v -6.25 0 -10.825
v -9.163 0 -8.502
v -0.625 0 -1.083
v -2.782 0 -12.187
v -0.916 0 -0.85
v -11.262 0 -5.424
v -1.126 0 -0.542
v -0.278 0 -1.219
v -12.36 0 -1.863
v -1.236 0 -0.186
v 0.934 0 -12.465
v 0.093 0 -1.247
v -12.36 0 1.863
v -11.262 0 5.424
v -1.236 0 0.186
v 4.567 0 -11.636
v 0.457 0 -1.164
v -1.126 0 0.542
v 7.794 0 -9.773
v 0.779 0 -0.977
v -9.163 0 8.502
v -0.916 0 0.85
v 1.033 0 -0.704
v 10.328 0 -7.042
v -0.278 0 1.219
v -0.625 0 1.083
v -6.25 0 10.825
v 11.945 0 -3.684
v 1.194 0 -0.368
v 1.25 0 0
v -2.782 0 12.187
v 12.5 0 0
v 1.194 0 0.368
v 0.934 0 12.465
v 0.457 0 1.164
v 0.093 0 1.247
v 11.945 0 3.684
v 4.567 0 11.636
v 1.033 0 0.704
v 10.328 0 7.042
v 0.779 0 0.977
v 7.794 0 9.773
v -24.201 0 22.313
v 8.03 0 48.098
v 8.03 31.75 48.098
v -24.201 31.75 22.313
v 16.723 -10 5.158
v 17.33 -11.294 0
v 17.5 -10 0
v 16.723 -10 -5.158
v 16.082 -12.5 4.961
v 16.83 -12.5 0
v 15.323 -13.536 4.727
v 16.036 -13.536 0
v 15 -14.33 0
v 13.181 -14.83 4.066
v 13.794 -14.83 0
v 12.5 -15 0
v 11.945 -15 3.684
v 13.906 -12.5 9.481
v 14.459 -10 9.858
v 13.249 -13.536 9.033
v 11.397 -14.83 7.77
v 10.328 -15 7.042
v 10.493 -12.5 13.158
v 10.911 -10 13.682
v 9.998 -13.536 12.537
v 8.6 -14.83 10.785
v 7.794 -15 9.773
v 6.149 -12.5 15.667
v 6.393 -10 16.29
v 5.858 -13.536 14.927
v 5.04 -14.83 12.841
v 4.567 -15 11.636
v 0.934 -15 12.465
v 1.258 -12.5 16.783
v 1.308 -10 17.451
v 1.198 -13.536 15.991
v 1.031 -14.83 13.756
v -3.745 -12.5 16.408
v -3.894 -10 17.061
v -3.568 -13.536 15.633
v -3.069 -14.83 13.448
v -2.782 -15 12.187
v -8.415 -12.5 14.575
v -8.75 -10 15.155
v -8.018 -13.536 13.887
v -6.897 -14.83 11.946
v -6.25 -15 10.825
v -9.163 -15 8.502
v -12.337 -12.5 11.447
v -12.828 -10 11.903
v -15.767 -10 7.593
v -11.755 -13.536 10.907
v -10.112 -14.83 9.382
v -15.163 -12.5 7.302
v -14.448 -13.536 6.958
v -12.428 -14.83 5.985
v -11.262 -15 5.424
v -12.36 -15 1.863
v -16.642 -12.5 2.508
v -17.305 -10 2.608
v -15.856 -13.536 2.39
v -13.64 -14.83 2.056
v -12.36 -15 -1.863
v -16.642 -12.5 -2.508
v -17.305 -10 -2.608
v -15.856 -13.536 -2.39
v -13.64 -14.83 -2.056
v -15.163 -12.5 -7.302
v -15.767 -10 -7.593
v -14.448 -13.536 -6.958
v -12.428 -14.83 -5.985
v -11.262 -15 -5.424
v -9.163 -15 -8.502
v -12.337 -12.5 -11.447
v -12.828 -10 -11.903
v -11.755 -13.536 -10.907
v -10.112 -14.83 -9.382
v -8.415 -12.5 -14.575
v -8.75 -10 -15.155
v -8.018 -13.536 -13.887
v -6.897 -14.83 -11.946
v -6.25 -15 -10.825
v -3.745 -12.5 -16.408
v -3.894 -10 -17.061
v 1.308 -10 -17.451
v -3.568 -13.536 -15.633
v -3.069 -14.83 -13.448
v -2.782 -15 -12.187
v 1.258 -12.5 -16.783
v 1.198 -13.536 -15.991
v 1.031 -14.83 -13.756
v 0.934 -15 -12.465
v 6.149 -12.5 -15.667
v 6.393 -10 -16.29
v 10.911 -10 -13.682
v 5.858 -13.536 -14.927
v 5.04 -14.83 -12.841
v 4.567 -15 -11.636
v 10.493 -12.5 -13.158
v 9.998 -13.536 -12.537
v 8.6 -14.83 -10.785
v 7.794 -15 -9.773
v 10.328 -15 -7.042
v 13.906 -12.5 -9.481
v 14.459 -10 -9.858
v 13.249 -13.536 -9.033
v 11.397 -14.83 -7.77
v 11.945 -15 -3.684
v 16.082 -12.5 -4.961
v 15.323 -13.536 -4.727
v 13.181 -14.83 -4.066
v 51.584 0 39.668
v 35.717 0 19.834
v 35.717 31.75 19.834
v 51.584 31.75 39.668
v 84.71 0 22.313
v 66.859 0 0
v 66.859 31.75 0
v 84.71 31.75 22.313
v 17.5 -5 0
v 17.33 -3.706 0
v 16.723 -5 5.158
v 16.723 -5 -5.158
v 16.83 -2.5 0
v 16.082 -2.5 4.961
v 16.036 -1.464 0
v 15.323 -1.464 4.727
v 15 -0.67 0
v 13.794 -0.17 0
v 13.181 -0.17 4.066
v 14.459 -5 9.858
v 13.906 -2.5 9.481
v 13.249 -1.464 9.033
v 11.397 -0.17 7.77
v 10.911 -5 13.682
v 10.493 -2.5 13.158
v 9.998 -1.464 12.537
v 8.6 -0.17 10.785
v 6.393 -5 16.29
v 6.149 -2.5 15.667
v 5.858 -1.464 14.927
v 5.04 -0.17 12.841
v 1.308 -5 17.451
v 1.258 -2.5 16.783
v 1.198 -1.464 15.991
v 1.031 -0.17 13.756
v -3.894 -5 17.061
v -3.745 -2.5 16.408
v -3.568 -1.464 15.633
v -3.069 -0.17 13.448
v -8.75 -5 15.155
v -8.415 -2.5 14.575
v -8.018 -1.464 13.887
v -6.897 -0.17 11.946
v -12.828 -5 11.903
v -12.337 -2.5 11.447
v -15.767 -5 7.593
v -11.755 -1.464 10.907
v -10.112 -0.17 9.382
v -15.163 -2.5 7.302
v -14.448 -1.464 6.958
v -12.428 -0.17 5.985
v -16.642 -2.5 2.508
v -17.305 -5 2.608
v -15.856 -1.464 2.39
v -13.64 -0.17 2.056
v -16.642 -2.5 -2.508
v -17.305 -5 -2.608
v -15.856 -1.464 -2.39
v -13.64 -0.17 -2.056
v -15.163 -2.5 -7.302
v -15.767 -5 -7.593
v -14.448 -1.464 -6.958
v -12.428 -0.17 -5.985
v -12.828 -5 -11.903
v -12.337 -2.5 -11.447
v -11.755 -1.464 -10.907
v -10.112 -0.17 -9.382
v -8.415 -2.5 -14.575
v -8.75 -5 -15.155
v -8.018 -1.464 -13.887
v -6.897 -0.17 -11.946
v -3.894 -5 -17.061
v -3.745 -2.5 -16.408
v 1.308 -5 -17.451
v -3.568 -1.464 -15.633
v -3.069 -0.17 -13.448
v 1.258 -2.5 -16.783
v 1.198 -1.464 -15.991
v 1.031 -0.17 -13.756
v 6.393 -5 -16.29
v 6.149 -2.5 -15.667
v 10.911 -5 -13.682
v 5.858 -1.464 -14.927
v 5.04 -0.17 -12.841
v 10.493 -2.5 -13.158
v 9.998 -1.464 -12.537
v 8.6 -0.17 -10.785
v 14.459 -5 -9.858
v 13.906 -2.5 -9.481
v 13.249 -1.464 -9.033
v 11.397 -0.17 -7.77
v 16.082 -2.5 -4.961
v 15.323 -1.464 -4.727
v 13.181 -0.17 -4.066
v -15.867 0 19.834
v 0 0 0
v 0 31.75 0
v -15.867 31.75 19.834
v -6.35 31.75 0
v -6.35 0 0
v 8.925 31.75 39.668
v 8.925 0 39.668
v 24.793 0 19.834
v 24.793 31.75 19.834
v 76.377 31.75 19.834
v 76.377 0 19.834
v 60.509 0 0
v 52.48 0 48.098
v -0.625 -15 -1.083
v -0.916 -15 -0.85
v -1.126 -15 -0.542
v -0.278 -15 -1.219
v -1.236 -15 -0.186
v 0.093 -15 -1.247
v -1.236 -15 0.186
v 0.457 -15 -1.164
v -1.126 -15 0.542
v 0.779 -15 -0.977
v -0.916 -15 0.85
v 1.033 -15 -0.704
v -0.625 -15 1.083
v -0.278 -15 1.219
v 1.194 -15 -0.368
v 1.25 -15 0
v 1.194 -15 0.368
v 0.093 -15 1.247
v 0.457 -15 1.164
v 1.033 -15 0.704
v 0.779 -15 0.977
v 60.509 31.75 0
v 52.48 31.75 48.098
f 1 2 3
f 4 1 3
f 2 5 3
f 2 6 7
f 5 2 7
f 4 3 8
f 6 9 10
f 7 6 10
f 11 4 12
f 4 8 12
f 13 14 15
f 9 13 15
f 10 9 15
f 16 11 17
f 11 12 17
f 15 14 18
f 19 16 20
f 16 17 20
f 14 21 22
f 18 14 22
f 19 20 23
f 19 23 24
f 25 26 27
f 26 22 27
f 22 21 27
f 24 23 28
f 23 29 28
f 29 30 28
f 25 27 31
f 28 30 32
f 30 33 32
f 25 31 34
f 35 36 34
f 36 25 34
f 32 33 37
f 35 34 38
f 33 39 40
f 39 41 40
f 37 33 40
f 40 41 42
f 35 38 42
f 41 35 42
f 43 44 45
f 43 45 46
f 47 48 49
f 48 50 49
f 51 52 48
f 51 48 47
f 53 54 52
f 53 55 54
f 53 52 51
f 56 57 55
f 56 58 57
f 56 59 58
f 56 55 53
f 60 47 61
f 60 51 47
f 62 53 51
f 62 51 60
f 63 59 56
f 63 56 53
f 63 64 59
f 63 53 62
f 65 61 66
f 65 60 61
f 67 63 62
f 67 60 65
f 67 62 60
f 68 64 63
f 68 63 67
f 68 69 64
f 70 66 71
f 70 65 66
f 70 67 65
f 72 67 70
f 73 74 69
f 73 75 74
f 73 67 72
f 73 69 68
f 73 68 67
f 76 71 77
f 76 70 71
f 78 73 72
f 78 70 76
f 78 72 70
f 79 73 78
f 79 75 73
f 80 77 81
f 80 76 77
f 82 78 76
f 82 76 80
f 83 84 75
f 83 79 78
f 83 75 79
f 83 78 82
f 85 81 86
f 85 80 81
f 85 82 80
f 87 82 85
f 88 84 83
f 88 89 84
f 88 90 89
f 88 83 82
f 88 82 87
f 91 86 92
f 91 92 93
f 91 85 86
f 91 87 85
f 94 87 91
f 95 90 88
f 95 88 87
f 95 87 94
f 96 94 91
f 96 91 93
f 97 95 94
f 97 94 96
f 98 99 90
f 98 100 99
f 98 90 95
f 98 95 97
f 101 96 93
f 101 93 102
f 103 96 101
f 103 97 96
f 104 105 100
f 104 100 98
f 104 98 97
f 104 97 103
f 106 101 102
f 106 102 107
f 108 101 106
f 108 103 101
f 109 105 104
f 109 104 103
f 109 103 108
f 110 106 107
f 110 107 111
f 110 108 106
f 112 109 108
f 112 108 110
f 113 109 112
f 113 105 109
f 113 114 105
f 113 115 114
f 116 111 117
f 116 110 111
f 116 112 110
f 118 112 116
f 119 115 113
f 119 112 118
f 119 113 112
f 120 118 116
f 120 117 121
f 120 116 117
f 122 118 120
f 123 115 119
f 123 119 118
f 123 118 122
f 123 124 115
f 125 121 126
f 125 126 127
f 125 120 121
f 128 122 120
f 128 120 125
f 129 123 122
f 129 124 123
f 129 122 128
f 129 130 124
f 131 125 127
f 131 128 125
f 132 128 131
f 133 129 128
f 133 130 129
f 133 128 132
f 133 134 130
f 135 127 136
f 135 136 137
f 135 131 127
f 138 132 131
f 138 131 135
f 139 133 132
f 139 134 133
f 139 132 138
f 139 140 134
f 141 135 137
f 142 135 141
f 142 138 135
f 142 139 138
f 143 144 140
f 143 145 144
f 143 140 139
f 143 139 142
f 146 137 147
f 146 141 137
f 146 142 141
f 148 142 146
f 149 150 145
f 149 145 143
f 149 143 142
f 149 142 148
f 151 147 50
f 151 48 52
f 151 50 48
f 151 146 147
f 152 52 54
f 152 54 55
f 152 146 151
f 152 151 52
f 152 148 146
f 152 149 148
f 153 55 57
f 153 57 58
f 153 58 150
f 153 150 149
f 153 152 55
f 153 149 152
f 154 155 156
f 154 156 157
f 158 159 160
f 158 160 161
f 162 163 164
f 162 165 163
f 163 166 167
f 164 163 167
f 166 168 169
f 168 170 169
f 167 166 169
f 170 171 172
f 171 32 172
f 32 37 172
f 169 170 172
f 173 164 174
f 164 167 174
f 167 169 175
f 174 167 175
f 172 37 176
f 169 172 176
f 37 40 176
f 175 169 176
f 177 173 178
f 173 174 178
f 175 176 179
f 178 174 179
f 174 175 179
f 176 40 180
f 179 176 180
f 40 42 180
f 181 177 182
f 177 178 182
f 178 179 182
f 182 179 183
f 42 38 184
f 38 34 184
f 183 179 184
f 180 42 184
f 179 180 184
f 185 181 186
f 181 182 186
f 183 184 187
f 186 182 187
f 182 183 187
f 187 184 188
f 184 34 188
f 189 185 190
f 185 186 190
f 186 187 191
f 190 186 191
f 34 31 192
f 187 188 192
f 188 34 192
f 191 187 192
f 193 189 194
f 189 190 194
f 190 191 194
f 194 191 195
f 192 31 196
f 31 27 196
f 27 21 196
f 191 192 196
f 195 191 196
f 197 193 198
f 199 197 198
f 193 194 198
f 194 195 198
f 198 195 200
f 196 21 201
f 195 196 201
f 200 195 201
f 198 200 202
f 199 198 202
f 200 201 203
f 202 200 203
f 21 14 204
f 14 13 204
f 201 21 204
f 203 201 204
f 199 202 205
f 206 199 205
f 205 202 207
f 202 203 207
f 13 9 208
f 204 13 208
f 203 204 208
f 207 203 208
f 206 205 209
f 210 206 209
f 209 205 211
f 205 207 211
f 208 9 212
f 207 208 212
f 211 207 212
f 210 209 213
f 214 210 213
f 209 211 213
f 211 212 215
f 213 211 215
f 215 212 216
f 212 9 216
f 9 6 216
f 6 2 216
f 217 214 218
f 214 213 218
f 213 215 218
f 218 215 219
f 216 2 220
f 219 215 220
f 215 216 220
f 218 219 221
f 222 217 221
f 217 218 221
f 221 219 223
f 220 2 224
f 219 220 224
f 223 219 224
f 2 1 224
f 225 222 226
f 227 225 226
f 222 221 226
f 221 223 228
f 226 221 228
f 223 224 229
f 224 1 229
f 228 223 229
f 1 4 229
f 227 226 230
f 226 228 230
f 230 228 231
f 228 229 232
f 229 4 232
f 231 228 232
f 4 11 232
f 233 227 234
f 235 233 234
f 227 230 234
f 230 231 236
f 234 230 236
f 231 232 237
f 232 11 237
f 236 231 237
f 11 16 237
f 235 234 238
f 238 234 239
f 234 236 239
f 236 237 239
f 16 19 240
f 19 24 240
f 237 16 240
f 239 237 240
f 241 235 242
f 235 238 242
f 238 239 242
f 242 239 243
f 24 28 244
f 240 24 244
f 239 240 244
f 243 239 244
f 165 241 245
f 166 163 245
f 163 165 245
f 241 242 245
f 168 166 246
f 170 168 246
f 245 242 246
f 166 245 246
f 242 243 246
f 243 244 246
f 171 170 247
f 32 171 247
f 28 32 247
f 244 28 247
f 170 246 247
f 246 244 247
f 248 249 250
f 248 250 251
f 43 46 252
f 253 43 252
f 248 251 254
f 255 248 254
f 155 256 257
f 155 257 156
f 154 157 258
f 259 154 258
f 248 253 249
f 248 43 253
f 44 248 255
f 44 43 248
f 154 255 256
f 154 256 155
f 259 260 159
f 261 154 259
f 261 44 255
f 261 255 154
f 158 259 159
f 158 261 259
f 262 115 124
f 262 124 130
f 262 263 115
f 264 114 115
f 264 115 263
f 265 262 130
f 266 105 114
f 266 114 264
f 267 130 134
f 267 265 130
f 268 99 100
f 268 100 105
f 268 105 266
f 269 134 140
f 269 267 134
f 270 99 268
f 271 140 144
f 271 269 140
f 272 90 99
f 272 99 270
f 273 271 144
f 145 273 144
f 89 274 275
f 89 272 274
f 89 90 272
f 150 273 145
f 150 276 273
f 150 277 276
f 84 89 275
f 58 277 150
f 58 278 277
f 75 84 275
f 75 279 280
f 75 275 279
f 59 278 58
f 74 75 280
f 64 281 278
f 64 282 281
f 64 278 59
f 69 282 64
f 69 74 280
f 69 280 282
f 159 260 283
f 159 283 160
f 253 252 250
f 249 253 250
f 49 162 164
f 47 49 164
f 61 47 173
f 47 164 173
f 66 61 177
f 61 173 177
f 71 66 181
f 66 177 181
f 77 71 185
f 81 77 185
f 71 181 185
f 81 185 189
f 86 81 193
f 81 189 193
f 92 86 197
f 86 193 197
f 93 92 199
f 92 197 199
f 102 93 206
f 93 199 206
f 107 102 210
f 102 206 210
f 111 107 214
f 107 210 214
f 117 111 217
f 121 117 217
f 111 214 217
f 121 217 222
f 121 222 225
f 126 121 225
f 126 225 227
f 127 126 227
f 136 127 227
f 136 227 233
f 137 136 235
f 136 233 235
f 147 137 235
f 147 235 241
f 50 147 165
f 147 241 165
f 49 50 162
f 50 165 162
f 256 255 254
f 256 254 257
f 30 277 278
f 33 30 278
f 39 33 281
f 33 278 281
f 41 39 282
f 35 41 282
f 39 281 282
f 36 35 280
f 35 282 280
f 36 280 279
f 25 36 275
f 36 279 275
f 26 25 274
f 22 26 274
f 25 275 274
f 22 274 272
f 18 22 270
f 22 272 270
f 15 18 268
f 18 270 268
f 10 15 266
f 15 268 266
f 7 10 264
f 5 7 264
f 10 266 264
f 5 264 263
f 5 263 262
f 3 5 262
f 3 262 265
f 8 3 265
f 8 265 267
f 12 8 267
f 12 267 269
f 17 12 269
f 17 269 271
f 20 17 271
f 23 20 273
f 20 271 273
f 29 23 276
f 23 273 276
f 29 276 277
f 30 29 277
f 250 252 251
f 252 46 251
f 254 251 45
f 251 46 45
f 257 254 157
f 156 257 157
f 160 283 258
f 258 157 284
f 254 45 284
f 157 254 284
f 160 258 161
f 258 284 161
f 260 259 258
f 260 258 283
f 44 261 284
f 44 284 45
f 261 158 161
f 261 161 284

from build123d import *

# Parameters (mm, degrees)
F1_DEPTH = 31.75
F2_R     = 17.5
F3_DEPTH = 15
F4_R     = 5
F5_R     = 1.25
F6_DEPTH = 15


with BuildPart() as f1:
    # F0 (on Front) → F1 (new body)
    with BuildSketch(Plane.XZ):
        Polygon((-6.35, 0), (0, 0), (-15.867254, 19.834068), (8.92533, 39.668136), (24.792585, 19.834068), (35.716649, 19.834015), (51.584078, 39.668165), (76.376596, 19.834015), (60.509276, 0), (66.859276, 0), (84.709973, 22.313218), (52.479699, 48.097614), (8.029699, 48.097614), (-24.200661, 22.313326), align=None)
    extrude(amount=-F1_DEPTH)


with BuildPart() as f3:
    # F2 (on Front) → F3 (new body)
    with BuildSketch(Plane.XZ):
        Circle(F2_R)
    extrude(amount=F3_DEPTH)

    # F4
    f4_edges = [f3.edges().sort_by_distance(p)[0] for p in [
        (-17.5, -15, 0),
        (-17.5, 0, 0),
    ]]
    fillet(f4_edges, radius=F4_R)

    # F5 (on face) → F6 (cut)
    with BuildSketch(Plane.XZ.offset(15)):
        Circle(F5_R)
    extrude(amount=-F6_DEPTH, mode=Mode.SUBTRACT)


solid = Compound([f1.part, f3.part])
